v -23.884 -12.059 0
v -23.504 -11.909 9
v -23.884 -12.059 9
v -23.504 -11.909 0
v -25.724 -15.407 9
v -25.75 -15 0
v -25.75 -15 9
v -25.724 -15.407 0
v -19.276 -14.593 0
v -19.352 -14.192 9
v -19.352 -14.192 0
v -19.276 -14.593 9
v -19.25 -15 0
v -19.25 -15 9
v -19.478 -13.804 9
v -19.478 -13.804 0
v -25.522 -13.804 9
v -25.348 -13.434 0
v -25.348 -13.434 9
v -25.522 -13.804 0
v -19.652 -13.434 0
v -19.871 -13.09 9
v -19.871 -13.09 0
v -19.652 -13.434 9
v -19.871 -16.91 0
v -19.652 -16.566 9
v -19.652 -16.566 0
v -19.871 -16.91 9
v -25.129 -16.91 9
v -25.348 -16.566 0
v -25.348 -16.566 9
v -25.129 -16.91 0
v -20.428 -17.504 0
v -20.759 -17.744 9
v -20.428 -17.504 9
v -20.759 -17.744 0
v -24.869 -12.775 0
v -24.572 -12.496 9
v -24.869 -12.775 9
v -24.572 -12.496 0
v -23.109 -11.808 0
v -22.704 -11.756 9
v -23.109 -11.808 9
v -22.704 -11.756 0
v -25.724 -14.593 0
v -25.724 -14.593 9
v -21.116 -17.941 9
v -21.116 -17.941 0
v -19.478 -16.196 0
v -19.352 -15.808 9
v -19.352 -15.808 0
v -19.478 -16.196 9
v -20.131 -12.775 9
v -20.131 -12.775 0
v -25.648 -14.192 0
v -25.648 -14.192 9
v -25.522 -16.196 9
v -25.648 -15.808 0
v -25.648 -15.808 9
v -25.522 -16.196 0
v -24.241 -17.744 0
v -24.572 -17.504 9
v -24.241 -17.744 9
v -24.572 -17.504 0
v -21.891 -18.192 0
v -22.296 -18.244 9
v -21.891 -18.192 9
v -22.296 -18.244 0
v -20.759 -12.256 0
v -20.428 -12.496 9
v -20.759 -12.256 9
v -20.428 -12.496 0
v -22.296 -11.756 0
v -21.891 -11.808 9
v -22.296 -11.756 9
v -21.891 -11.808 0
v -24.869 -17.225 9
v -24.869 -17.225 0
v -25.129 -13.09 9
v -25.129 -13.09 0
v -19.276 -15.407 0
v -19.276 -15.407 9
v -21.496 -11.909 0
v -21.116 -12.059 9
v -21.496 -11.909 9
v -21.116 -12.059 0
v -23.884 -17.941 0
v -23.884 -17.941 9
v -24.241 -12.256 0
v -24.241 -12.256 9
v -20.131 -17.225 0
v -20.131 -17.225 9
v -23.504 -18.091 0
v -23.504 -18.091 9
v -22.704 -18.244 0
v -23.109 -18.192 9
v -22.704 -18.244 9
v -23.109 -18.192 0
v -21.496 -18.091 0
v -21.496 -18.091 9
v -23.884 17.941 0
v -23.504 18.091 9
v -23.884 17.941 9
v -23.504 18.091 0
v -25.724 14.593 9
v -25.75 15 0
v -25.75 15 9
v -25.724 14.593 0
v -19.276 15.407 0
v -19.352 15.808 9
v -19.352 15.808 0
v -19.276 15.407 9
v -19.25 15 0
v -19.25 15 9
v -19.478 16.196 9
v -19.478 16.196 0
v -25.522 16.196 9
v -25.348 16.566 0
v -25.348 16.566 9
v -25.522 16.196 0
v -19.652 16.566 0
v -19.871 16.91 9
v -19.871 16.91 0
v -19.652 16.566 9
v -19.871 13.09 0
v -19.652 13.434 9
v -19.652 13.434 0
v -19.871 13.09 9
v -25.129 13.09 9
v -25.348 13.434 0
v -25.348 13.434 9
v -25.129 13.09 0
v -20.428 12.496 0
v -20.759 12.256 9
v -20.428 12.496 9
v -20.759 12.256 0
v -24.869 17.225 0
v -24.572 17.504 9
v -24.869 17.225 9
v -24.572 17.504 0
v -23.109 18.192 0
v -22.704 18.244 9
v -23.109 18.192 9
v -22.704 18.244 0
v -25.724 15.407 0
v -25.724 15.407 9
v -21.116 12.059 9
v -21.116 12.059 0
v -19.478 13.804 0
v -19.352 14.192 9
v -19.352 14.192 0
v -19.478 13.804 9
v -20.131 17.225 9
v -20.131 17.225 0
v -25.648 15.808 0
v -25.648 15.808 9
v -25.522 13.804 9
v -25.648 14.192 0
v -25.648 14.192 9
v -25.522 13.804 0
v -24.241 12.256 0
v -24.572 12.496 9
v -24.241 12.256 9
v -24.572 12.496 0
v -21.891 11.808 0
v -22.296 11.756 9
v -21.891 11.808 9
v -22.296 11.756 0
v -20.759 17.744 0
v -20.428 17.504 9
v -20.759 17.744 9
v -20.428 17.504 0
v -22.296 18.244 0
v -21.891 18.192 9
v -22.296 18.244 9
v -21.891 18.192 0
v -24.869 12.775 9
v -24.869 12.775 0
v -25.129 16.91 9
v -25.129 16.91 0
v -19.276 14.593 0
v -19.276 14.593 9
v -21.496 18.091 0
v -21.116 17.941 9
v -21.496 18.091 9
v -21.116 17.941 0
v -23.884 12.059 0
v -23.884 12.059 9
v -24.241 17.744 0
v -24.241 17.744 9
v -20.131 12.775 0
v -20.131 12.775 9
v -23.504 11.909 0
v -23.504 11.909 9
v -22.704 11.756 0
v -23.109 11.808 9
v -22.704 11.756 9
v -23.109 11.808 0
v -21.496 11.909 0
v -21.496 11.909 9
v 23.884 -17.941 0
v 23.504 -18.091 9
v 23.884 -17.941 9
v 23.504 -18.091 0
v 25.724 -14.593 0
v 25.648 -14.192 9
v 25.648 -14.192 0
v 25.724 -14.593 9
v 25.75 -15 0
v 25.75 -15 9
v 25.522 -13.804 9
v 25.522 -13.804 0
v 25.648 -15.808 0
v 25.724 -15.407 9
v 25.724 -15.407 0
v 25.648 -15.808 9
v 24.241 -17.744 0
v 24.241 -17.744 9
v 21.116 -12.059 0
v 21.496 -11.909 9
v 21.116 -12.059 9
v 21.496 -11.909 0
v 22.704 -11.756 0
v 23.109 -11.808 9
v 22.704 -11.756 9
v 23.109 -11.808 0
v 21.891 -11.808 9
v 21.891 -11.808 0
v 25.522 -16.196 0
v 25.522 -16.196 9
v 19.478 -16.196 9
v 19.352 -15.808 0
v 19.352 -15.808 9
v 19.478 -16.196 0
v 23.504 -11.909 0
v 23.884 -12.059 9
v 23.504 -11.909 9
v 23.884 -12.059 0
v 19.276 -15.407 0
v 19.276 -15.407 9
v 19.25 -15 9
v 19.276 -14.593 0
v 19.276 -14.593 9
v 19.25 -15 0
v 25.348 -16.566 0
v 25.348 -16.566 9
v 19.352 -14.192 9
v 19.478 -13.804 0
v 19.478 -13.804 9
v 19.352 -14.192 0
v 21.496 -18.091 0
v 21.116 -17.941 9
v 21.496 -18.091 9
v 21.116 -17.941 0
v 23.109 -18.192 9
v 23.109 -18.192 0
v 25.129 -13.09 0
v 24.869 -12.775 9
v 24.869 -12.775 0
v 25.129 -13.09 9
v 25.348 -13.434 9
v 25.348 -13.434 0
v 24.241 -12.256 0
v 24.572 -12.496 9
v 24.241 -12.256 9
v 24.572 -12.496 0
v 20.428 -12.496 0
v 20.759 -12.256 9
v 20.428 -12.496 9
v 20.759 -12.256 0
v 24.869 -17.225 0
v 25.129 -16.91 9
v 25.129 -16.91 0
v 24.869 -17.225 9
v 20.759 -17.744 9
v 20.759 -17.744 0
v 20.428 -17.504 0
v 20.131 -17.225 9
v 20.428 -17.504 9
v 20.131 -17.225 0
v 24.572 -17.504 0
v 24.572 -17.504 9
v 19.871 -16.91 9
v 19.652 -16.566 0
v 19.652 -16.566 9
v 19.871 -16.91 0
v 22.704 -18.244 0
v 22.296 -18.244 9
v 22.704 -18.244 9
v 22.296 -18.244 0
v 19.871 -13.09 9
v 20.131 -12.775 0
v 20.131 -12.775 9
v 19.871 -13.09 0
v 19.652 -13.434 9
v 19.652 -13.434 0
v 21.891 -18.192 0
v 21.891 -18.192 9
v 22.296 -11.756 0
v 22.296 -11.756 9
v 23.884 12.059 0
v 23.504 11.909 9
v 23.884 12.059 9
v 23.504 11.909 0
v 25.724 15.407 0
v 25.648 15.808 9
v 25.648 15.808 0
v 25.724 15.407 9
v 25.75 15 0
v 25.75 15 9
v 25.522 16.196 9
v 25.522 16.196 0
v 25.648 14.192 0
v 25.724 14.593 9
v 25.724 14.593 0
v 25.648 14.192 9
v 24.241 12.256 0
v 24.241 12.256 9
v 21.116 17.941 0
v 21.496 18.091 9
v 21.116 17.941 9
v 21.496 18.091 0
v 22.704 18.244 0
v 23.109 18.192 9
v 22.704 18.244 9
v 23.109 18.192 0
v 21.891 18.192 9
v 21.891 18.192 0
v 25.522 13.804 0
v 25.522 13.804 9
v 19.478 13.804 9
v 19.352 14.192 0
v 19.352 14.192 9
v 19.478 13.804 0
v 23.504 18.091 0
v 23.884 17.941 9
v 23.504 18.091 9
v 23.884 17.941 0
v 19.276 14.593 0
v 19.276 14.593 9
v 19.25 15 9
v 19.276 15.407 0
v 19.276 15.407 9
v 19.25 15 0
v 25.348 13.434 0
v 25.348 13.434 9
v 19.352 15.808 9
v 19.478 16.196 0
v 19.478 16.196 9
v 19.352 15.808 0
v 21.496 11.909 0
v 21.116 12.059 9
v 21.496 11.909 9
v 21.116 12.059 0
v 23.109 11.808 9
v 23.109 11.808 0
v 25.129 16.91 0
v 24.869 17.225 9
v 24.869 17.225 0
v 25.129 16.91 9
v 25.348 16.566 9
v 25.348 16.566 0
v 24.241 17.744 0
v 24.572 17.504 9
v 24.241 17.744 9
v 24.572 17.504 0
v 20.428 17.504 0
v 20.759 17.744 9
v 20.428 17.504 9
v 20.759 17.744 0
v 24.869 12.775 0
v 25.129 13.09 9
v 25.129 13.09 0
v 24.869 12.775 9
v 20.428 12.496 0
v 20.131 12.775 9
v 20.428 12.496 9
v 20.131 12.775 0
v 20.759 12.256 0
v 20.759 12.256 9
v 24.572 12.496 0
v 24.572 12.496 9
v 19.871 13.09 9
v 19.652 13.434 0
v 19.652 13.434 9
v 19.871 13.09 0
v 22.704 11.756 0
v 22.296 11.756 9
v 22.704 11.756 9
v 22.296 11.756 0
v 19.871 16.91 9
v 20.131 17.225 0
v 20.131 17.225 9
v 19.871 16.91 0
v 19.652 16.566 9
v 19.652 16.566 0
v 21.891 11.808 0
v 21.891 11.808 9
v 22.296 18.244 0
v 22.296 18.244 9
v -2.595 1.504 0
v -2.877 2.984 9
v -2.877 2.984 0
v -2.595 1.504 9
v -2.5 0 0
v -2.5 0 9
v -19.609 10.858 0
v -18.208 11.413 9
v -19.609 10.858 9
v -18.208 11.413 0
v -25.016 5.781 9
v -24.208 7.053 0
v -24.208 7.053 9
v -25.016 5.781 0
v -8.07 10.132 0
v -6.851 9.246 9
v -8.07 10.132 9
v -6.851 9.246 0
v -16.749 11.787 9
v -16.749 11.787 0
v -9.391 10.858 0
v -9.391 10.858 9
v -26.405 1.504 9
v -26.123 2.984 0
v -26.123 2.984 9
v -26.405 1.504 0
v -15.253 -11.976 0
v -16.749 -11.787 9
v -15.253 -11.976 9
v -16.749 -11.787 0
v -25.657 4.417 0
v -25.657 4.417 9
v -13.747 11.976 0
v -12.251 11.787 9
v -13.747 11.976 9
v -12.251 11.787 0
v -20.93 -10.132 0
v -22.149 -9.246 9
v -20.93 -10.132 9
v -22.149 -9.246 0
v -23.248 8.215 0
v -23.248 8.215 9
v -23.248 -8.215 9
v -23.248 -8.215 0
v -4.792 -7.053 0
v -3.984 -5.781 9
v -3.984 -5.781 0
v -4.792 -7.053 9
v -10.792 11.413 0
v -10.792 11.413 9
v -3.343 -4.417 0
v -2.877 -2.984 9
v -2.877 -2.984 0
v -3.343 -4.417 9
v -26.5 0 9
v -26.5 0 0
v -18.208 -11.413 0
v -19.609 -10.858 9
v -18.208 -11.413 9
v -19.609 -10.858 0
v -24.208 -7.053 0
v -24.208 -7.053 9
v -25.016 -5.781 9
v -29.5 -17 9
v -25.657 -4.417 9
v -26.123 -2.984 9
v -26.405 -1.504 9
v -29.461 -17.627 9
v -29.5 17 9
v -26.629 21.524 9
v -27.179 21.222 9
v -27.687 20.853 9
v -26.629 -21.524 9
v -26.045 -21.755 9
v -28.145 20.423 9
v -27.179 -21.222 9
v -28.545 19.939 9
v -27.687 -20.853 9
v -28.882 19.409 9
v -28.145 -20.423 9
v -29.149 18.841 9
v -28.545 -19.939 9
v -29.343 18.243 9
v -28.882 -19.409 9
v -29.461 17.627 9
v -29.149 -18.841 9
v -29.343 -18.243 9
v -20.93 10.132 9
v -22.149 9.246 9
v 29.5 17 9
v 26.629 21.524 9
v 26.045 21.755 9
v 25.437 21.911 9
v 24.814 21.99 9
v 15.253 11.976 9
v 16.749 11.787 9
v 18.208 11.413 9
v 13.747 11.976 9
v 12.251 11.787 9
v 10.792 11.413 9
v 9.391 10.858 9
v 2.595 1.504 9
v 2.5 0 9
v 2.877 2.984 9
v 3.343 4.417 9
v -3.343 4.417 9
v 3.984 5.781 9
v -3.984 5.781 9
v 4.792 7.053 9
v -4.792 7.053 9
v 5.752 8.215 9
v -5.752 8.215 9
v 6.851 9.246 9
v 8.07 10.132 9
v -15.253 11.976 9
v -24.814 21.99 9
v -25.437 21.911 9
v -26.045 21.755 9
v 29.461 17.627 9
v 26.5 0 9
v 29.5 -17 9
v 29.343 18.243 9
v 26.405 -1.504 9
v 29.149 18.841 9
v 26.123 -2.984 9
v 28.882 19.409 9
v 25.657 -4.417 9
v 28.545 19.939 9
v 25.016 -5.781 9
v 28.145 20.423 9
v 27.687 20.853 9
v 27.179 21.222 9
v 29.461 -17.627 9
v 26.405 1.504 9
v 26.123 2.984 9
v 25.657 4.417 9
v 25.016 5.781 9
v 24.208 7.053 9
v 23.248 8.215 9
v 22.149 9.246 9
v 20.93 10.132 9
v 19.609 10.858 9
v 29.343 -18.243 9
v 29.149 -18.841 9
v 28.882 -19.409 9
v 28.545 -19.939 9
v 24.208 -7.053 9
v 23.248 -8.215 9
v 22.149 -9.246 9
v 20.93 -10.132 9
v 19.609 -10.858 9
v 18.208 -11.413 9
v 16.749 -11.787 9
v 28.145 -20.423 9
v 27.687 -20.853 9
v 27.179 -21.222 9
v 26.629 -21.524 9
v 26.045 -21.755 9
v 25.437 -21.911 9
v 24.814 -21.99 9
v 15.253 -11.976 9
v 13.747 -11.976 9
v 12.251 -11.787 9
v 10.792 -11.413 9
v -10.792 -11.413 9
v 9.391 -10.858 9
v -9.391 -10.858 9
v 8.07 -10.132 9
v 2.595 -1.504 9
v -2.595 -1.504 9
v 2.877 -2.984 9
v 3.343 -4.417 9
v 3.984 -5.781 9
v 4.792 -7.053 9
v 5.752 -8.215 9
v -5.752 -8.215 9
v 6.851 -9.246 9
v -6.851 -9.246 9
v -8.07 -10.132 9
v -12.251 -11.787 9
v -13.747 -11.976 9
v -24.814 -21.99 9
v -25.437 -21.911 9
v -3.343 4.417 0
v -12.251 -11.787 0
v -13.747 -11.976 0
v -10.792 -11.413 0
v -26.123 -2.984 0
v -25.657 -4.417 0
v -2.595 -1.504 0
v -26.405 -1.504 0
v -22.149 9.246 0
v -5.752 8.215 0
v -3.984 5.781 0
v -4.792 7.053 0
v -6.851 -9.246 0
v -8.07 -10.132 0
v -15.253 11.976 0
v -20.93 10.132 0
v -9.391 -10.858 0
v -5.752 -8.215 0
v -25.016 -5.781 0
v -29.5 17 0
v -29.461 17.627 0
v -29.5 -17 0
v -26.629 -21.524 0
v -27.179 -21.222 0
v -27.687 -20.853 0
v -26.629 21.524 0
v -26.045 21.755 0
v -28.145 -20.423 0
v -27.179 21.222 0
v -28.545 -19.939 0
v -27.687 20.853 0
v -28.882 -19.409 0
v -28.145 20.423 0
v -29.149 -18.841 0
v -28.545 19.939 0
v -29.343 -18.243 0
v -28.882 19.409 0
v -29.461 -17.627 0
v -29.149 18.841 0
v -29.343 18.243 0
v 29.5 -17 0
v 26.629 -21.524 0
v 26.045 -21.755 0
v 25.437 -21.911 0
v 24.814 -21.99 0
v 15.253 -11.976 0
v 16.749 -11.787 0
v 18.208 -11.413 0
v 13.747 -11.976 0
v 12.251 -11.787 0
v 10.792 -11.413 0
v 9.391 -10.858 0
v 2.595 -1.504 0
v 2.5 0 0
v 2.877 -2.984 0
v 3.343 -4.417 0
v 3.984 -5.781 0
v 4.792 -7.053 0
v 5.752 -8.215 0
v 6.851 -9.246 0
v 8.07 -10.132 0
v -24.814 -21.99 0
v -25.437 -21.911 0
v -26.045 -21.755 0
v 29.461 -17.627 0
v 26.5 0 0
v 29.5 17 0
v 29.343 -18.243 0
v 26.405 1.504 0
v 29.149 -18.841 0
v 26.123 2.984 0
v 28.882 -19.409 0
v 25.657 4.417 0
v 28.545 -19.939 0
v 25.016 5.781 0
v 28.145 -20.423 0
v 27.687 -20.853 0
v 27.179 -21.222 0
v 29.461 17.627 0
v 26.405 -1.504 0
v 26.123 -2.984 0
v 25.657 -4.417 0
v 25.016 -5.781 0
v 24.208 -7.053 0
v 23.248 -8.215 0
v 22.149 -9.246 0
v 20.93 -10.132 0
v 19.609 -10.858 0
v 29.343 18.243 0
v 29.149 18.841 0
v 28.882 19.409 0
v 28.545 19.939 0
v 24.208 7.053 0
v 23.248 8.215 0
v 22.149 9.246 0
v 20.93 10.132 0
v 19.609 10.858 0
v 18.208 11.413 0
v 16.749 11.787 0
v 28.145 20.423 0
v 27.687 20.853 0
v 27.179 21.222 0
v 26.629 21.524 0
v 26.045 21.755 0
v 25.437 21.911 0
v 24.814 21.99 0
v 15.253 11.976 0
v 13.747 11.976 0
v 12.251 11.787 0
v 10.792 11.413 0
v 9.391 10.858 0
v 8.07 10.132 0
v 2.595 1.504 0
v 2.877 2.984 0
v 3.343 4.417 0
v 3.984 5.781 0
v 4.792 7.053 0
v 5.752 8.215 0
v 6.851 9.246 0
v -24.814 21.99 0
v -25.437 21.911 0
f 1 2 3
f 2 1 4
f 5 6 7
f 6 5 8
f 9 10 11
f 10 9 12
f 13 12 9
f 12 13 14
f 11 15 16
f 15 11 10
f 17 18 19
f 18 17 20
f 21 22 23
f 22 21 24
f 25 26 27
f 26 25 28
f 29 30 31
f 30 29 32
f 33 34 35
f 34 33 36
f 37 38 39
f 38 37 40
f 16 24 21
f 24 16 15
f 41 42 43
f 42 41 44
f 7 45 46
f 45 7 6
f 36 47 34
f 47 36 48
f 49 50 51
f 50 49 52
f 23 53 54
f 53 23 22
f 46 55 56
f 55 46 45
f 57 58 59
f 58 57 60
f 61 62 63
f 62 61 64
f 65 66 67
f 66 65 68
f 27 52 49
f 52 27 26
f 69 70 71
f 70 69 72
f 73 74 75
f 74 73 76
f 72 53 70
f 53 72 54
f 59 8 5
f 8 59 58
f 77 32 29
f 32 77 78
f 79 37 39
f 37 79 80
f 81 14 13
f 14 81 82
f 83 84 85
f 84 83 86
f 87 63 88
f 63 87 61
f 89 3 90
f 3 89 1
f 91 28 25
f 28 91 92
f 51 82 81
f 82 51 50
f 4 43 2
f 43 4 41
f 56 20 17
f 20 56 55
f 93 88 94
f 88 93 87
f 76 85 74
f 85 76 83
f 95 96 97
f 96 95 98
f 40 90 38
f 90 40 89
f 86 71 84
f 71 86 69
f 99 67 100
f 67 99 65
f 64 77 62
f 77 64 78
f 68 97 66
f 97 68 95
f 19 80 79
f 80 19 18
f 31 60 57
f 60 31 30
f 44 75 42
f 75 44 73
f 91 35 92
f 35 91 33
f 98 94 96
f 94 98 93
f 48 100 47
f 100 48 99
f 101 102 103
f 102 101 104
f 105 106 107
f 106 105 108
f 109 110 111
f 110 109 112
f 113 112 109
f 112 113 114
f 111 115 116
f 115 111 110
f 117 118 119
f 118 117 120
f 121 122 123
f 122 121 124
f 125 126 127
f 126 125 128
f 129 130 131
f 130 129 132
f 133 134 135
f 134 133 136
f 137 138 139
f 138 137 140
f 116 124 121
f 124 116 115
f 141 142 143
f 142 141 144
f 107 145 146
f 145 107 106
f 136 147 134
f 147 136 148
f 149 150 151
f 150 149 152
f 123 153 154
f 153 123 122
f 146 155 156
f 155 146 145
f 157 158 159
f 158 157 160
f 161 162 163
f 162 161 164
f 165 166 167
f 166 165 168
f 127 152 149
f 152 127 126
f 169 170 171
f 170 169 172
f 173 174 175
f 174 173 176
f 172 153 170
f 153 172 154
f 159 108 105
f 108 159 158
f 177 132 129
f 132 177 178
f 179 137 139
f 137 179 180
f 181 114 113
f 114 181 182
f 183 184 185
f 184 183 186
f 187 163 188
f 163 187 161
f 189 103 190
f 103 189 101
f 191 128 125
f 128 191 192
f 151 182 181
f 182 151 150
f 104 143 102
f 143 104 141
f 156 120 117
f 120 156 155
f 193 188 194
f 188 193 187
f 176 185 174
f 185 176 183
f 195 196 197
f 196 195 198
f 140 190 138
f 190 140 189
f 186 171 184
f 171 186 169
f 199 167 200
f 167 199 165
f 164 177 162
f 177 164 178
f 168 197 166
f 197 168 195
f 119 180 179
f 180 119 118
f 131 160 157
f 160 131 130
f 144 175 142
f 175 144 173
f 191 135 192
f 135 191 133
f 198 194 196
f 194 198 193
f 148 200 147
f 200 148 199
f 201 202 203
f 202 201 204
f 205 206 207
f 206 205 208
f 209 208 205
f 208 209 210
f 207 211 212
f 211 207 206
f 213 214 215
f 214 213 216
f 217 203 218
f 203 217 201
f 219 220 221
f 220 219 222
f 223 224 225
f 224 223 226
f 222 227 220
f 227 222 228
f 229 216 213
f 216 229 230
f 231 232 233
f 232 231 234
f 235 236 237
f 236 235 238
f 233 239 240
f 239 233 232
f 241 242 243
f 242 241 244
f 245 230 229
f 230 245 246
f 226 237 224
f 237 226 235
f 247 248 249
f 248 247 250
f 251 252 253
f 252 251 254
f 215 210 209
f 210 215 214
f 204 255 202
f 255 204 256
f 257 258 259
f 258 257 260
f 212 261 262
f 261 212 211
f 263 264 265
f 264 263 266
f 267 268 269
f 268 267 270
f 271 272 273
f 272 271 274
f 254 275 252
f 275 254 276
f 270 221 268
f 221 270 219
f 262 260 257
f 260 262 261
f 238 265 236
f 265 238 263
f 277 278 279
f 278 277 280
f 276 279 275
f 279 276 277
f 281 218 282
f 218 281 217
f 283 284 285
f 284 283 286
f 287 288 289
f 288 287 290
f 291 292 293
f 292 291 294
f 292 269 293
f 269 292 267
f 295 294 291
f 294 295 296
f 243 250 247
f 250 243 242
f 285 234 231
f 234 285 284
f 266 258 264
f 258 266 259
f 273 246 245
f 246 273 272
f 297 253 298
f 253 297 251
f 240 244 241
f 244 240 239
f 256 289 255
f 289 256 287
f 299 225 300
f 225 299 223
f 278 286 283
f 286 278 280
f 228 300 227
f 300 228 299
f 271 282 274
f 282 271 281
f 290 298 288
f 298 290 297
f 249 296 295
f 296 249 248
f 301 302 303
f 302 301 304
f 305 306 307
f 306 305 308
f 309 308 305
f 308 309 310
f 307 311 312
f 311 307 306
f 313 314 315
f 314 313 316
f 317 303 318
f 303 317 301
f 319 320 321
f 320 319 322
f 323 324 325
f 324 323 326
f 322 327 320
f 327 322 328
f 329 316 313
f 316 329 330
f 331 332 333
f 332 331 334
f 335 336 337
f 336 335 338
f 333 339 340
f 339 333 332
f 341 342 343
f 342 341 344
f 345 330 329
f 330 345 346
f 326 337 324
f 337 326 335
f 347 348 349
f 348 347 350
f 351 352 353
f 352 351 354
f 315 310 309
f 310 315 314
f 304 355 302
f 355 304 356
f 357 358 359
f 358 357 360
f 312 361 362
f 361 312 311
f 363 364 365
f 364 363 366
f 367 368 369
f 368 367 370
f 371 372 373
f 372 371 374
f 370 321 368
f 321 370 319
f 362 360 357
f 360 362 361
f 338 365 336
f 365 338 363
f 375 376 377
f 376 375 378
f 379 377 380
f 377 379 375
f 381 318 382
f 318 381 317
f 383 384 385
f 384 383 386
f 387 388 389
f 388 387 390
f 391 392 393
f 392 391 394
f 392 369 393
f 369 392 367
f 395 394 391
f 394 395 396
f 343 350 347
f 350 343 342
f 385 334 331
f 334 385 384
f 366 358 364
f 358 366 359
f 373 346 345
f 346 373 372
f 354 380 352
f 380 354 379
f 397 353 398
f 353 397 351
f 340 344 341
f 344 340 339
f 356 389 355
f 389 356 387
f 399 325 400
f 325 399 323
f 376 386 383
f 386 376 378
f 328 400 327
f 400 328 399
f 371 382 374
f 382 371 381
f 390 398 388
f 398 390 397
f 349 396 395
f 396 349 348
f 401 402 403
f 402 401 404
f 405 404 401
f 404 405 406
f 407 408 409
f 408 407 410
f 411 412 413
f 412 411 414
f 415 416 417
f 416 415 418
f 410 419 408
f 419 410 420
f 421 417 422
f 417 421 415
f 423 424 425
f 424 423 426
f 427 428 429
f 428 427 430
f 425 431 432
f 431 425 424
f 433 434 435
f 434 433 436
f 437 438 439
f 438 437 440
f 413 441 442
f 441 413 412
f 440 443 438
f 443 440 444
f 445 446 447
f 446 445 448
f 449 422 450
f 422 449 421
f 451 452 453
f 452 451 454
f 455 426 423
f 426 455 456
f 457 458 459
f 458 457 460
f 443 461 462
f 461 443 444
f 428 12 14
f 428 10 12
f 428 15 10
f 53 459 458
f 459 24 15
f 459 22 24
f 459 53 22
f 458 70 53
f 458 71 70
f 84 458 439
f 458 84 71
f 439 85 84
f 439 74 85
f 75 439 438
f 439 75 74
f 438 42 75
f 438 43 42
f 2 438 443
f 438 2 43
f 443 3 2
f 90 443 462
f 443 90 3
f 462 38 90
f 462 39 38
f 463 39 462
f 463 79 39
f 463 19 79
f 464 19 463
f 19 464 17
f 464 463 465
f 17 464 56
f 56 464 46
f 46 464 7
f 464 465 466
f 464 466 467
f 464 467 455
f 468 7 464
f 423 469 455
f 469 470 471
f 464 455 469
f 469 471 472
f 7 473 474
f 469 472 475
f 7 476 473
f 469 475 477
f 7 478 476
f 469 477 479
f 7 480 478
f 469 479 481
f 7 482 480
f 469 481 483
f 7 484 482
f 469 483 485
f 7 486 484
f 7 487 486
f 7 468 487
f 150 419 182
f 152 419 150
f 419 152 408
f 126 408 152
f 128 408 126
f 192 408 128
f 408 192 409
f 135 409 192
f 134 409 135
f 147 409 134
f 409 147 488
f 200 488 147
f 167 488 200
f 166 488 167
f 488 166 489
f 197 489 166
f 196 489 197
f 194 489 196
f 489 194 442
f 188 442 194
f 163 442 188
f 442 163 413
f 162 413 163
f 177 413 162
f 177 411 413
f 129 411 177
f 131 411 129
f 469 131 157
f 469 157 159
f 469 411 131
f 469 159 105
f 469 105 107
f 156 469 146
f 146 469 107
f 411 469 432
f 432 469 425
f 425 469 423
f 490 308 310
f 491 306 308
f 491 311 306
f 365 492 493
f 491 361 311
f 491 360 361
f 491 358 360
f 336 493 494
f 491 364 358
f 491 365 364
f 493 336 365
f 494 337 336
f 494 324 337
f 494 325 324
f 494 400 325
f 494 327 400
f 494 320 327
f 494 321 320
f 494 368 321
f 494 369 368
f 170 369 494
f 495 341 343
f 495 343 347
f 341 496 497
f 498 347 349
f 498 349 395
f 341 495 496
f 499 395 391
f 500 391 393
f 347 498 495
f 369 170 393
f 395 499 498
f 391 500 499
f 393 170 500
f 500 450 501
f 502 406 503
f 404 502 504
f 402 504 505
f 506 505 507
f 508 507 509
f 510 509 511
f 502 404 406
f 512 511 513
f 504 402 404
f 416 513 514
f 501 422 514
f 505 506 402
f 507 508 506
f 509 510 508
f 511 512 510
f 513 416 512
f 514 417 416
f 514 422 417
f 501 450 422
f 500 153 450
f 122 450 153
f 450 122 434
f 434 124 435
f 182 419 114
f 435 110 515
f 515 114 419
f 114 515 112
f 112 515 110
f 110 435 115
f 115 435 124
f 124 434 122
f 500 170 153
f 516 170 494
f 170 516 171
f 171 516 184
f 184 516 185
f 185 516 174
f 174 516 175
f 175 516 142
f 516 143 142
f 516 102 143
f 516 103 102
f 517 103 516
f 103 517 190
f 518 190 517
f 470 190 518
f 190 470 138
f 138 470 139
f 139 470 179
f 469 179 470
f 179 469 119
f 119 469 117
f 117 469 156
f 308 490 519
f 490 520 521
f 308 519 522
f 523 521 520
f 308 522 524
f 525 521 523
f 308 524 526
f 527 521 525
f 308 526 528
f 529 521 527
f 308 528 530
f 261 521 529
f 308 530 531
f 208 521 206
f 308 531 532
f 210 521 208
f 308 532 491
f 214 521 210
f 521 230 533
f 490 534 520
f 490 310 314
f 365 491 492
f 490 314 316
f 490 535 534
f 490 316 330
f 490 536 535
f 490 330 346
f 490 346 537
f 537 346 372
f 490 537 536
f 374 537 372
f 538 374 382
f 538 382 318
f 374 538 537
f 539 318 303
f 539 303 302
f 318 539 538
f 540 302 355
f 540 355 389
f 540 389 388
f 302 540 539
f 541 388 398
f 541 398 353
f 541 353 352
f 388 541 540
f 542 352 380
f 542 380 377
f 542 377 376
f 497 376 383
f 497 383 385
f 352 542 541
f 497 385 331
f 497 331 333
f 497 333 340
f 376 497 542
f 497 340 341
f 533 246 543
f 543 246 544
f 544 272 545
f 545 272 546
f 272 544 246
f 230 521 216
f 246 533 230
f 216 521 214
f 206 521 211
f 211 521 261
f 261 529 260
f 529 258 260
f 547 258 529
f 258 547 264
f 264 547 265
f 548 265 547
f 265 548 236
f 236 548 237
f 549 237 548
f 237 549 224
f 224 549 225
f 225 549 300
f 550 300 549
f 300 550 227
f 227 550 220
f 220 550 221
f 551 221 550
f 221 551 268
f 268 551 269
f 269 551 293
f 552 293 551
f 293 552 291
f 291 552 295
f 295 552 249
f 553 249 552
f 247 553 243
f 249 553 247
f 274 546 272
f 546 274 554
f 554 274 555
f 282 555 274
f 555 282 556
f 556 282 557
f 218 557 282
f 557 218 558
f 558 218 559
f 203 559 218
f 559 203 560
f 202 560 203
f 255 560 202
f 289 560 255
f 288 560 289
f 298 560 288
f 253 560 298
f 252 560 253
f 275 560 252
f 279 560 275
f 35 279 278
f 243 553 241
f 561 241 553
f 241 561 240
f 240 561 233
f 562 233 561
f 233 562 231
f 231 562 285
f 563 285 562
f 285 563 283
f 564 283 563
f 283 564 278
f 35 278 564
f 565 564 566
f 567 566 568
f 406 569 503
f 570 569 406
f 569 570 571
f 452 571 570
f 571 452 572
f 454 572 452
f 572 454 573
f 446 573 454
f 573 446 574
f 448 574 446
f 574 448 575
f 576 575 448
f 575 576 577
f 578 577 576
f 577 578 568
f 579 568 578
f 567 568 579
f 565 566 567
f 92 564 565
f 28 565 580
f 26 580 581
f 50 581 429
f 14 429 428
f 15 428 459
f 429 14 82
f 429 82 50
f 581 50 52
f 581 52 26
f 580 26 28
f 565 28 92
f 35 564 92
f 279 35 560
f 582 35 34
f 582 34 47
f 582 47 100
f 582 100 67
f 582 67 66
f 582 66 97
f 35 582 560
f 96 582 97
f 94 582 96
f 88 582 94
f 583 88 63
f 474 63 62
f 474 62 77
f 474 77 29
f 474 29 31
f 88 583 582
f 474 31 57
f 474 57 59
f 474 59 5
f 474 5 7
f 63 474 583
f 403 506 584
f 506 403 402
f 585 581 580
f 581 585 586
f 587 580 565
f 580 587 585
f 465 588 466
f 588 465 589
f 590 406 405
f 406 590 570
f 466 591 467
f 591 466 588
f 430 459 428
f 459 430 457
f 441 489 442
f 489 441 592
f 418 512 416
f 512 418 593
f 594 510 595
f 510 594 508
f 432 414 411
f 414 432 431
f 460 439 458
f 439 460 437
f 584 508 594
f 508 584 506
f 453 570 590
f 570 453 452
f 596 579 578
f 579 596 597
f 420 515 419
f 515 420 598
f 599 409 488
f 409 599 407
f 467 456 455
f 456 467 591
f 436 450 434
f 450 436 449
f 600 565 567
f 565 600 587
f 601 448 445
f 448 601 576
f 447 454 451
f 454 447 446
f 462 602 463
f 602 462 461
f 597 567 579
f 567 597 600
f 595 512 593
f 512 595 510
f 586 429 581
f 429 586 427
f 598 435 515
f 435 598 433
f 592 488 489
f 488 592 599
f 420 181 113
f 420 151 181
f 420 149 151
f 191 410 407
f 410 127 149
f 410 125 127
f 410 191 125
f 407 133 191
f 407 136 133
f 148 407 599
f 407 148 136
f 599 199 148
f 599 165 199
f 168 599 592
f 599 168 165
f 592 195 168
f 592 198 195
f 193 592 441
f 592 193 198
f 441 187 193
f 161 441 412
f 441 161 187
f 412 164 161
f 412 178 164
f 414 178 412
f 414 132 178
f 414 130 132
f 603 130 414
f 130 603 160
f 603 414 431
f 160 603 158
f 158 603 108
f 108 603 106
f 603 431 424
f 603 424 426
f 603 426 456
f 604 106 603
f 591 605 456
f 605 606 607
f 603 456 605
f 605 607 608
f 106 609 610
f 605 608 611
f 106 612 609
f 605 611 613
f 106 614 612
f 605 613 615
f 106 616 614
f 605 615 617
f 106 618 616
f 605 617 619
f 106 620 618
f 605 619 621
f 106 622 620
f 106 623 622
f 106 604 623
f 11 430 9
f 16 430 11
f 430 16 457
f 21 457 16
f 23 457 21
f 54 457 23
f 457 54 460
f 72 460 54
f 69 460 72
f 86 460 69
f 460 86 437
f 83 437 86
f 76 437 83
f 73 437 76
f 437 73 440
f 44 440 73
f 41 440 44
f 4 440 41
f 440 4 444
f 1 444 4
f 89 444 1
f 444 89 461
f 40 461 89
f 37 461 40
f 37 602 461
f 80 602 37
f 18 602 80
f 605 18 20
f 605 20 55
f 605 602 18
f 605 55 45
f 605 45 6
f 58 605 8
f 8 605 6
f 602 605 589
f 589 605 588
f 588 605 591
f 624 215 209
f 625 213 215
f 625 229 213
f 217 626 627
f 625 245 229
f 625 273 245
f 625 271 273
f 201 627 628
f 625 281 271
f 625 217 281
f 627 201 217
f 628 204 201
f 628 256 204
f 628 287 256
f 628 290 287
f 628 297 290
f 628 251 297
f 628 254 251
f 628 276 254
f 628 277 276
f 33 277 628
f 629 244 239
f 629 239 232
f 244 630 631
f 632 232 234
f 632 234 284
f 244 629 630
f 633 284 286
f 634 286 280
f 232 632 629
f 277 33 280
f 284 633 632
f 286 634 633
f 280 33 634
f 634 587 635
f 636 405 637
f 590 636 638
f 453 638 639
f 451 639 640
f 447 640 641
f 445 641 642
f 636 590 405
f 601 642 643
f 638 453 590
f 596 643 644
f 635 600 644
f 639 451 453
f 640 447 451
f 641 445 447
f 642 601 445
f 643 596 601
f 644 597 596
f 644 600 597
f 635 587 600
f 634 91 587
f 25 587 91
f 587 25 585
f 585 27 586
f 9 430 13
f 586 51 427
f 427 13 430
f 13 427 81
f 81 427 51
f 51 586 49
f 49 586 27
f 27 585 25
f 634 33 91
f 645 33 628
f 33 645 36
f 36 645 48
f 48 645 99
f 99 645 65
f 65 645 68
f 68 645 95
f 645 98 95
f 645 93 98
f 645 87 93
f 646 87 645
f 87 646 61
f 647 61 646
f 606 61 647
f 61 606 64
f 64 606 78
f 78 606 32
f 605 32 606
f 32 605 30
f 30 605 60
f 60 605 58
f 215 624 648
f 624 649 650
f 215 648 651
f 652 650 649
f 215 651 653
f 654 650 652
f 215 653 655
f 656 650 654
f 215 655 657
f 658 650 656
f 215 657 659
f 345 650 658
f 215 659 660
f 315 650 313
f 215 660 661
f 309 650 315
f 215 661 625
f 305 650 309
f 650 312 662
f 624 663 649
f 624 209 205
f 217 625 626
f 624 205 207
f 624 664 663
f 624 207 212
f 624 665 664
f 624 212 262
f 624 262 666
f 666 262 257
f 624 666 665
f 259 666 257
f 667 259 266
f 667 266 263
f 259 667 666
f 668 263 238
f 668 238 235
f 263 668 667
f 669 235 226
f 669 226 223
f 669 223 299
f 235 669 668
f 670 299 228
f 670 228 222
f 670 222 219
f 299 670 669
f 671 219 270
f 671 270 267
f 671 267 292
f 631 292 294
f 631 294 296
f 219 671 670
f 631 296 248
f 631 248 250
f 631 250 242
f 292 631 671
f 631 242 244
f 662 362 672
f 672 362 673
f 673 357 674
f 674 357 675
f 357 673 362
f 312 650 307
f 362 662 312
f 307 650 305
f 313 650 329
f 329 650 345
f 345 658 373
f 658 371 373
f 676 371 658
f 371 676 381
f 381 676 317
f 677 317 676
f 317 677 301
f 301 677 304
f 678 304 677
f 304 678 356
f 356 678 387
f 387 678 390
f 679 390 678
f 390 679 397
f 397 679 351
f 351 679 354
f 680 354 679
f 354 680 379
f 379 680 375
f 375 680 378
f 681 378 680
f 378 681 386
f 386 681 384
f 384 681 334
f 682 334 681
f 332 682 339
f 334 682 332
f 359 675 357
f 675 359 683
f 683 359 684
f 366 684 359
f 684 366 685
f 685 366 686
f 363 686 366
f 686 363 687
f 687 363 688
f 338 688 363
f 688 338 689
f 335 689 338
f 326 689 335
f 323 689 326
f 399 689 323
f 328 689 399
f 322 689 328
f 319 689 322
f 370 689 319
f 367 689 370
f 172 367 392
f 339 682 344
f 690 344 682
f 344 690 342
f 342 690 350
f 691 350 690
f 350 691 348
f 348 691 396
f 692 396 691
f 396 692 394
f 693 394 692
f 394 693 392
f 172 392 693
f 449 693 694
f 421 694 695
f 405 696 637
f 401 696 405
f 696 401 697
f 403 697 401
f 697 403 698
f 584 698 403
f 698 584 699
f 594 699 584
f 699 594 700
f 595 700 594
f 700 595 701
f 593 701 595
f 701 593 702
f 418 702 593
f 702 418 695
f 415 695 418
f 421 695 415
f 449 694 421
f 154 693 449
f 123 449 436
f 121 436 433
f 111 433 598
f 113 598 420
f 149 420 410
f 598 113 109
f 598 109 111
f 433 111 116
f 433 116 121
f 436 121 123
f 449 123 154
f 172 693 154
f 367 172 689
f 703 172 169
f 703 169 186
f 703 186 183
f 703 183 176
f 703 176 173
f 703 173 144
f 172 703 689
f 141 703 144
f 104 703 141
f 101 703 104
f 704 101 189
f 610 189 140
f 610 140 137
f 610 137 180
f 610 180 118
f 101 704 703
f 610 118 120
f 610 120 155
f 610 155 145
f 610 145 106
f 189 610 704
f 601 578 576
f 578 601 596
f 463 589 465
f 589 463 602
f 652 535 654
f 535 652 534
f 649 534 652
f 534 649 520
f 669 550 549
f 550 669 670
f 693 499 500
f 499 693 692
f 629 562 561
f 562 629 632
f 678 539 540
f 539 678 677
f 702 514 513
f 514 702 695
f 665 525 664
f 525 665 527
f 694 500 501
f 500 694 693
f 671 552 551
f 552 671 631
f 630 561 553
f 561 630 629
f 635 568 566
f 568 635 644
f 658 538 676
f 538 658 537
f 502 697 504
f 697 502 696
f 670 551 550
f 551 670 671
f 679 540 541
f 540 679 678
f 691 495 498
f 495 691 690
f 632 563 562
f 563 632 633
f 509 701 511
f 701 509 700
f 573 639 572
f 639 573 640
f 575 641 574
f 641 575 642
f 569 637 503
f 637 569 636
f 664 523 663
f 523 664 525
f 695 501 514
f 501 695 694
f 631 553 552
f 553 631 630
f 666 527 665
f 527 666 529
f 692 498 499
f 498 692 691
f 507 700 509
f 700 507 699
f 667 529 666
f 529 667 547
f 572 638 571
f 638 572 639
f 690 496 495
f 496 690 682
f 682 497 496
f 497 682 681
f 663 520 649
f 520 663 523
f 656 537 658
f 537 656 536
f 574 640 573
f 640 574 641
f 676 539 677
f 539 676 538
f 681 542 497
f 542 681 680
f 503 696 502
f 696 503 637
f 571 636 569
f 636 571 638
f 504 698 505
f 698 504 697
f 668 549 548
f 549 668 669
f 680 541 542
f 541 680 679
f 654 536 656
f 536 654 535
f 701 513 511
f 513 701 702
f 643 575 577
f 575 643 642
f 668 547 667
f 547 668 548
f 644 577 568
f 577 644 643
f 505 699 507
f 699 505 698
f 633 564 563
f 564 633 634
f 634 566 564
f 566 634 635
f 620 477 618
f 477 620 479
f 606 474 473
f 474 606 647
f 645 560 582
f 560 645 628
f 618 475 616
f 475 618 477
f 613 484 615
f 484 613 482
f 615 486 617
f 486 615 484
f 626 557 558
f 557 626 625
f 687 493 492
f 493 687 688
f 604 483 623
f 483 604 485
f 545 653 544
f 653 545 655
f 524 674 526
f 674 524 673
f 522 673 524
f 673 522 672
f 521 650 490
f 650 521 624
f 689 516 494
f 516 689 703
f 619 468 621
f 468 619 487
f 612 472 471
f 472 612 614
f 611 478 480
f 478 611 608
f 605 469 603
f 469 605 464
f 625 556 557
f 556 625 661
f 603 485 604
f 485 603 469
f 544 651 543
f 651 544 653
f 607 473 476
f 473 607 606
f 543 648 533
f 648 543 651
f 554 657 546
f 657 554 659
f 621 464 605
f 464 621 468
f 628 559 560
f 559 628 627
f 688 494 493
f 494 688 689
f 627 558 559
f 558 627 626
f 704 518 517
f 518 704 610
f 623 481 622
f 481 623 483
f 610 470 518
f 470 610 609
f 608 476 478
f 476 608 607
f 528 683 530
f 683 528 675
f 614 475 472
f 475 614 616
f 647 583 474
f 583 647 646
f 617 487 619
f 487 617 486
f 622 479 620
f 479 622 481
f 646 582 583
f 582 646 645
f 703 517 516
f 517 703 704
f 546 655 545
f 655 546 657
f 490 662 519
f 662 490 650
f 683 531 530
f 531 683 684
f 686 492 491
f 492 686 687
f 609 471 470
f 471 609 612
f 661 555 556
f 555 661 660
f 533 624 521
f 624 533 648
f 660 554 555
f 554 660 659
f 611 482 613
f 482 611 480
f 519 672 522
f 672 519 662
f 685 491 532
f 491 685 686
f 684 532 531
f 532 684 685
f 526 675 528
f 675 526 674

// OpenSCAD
$fn = 50;


difference() {
	union() {
		hull() {
			translate(v = [-24.5000000000, 17.0000000000, 0]) {
				cylinder(h = 9, r = 5);
			}
			translate(v = [24.5000000000, 17.0000000000, 0]) {
				cylinder(h = 9, r = 5);
			}
			translate(v = [-24.5000000000, -17.0000000000, 0]) {
				cylinder(h = 9, r = 5);
			}
			translate(v = [24.5000000000, -17.0000000000, 0]) {
				cylinder(h = 9, r = 5);
			}
		}
	}
	union() {
		#translate(v = [-22.5000000000, -15.0000000000, -100.0000000000]) {
			cylinder(h = 200, r = 3.2500000000);
		}
		#translate(v = [-22.5000000000, 15.0000000000, -100.0000000000]) {
			cylinder(h = 200, r = 3.2500000000);
		}
		#translate(v = [22.5000000000, -15.0000000000, -100.0000000000]) {
			cylinder(h = 200, r = 3.2500000000);
		}
		#translate(v = [22.5000000000, 15.0000000000, -100.0000000000]) {
			cylinder(h = 200, r = 3.2500000000);
		}
		#translate(v = [-14.5000000000, 0, 0]) {
			cylinder(h = 9, r = 12.0000000000);
		}
		#translate(v = [14.5000000000, 0, 0]) {
			cylinder(h = 9, r = 12.0000000000);
		}
	}
}
